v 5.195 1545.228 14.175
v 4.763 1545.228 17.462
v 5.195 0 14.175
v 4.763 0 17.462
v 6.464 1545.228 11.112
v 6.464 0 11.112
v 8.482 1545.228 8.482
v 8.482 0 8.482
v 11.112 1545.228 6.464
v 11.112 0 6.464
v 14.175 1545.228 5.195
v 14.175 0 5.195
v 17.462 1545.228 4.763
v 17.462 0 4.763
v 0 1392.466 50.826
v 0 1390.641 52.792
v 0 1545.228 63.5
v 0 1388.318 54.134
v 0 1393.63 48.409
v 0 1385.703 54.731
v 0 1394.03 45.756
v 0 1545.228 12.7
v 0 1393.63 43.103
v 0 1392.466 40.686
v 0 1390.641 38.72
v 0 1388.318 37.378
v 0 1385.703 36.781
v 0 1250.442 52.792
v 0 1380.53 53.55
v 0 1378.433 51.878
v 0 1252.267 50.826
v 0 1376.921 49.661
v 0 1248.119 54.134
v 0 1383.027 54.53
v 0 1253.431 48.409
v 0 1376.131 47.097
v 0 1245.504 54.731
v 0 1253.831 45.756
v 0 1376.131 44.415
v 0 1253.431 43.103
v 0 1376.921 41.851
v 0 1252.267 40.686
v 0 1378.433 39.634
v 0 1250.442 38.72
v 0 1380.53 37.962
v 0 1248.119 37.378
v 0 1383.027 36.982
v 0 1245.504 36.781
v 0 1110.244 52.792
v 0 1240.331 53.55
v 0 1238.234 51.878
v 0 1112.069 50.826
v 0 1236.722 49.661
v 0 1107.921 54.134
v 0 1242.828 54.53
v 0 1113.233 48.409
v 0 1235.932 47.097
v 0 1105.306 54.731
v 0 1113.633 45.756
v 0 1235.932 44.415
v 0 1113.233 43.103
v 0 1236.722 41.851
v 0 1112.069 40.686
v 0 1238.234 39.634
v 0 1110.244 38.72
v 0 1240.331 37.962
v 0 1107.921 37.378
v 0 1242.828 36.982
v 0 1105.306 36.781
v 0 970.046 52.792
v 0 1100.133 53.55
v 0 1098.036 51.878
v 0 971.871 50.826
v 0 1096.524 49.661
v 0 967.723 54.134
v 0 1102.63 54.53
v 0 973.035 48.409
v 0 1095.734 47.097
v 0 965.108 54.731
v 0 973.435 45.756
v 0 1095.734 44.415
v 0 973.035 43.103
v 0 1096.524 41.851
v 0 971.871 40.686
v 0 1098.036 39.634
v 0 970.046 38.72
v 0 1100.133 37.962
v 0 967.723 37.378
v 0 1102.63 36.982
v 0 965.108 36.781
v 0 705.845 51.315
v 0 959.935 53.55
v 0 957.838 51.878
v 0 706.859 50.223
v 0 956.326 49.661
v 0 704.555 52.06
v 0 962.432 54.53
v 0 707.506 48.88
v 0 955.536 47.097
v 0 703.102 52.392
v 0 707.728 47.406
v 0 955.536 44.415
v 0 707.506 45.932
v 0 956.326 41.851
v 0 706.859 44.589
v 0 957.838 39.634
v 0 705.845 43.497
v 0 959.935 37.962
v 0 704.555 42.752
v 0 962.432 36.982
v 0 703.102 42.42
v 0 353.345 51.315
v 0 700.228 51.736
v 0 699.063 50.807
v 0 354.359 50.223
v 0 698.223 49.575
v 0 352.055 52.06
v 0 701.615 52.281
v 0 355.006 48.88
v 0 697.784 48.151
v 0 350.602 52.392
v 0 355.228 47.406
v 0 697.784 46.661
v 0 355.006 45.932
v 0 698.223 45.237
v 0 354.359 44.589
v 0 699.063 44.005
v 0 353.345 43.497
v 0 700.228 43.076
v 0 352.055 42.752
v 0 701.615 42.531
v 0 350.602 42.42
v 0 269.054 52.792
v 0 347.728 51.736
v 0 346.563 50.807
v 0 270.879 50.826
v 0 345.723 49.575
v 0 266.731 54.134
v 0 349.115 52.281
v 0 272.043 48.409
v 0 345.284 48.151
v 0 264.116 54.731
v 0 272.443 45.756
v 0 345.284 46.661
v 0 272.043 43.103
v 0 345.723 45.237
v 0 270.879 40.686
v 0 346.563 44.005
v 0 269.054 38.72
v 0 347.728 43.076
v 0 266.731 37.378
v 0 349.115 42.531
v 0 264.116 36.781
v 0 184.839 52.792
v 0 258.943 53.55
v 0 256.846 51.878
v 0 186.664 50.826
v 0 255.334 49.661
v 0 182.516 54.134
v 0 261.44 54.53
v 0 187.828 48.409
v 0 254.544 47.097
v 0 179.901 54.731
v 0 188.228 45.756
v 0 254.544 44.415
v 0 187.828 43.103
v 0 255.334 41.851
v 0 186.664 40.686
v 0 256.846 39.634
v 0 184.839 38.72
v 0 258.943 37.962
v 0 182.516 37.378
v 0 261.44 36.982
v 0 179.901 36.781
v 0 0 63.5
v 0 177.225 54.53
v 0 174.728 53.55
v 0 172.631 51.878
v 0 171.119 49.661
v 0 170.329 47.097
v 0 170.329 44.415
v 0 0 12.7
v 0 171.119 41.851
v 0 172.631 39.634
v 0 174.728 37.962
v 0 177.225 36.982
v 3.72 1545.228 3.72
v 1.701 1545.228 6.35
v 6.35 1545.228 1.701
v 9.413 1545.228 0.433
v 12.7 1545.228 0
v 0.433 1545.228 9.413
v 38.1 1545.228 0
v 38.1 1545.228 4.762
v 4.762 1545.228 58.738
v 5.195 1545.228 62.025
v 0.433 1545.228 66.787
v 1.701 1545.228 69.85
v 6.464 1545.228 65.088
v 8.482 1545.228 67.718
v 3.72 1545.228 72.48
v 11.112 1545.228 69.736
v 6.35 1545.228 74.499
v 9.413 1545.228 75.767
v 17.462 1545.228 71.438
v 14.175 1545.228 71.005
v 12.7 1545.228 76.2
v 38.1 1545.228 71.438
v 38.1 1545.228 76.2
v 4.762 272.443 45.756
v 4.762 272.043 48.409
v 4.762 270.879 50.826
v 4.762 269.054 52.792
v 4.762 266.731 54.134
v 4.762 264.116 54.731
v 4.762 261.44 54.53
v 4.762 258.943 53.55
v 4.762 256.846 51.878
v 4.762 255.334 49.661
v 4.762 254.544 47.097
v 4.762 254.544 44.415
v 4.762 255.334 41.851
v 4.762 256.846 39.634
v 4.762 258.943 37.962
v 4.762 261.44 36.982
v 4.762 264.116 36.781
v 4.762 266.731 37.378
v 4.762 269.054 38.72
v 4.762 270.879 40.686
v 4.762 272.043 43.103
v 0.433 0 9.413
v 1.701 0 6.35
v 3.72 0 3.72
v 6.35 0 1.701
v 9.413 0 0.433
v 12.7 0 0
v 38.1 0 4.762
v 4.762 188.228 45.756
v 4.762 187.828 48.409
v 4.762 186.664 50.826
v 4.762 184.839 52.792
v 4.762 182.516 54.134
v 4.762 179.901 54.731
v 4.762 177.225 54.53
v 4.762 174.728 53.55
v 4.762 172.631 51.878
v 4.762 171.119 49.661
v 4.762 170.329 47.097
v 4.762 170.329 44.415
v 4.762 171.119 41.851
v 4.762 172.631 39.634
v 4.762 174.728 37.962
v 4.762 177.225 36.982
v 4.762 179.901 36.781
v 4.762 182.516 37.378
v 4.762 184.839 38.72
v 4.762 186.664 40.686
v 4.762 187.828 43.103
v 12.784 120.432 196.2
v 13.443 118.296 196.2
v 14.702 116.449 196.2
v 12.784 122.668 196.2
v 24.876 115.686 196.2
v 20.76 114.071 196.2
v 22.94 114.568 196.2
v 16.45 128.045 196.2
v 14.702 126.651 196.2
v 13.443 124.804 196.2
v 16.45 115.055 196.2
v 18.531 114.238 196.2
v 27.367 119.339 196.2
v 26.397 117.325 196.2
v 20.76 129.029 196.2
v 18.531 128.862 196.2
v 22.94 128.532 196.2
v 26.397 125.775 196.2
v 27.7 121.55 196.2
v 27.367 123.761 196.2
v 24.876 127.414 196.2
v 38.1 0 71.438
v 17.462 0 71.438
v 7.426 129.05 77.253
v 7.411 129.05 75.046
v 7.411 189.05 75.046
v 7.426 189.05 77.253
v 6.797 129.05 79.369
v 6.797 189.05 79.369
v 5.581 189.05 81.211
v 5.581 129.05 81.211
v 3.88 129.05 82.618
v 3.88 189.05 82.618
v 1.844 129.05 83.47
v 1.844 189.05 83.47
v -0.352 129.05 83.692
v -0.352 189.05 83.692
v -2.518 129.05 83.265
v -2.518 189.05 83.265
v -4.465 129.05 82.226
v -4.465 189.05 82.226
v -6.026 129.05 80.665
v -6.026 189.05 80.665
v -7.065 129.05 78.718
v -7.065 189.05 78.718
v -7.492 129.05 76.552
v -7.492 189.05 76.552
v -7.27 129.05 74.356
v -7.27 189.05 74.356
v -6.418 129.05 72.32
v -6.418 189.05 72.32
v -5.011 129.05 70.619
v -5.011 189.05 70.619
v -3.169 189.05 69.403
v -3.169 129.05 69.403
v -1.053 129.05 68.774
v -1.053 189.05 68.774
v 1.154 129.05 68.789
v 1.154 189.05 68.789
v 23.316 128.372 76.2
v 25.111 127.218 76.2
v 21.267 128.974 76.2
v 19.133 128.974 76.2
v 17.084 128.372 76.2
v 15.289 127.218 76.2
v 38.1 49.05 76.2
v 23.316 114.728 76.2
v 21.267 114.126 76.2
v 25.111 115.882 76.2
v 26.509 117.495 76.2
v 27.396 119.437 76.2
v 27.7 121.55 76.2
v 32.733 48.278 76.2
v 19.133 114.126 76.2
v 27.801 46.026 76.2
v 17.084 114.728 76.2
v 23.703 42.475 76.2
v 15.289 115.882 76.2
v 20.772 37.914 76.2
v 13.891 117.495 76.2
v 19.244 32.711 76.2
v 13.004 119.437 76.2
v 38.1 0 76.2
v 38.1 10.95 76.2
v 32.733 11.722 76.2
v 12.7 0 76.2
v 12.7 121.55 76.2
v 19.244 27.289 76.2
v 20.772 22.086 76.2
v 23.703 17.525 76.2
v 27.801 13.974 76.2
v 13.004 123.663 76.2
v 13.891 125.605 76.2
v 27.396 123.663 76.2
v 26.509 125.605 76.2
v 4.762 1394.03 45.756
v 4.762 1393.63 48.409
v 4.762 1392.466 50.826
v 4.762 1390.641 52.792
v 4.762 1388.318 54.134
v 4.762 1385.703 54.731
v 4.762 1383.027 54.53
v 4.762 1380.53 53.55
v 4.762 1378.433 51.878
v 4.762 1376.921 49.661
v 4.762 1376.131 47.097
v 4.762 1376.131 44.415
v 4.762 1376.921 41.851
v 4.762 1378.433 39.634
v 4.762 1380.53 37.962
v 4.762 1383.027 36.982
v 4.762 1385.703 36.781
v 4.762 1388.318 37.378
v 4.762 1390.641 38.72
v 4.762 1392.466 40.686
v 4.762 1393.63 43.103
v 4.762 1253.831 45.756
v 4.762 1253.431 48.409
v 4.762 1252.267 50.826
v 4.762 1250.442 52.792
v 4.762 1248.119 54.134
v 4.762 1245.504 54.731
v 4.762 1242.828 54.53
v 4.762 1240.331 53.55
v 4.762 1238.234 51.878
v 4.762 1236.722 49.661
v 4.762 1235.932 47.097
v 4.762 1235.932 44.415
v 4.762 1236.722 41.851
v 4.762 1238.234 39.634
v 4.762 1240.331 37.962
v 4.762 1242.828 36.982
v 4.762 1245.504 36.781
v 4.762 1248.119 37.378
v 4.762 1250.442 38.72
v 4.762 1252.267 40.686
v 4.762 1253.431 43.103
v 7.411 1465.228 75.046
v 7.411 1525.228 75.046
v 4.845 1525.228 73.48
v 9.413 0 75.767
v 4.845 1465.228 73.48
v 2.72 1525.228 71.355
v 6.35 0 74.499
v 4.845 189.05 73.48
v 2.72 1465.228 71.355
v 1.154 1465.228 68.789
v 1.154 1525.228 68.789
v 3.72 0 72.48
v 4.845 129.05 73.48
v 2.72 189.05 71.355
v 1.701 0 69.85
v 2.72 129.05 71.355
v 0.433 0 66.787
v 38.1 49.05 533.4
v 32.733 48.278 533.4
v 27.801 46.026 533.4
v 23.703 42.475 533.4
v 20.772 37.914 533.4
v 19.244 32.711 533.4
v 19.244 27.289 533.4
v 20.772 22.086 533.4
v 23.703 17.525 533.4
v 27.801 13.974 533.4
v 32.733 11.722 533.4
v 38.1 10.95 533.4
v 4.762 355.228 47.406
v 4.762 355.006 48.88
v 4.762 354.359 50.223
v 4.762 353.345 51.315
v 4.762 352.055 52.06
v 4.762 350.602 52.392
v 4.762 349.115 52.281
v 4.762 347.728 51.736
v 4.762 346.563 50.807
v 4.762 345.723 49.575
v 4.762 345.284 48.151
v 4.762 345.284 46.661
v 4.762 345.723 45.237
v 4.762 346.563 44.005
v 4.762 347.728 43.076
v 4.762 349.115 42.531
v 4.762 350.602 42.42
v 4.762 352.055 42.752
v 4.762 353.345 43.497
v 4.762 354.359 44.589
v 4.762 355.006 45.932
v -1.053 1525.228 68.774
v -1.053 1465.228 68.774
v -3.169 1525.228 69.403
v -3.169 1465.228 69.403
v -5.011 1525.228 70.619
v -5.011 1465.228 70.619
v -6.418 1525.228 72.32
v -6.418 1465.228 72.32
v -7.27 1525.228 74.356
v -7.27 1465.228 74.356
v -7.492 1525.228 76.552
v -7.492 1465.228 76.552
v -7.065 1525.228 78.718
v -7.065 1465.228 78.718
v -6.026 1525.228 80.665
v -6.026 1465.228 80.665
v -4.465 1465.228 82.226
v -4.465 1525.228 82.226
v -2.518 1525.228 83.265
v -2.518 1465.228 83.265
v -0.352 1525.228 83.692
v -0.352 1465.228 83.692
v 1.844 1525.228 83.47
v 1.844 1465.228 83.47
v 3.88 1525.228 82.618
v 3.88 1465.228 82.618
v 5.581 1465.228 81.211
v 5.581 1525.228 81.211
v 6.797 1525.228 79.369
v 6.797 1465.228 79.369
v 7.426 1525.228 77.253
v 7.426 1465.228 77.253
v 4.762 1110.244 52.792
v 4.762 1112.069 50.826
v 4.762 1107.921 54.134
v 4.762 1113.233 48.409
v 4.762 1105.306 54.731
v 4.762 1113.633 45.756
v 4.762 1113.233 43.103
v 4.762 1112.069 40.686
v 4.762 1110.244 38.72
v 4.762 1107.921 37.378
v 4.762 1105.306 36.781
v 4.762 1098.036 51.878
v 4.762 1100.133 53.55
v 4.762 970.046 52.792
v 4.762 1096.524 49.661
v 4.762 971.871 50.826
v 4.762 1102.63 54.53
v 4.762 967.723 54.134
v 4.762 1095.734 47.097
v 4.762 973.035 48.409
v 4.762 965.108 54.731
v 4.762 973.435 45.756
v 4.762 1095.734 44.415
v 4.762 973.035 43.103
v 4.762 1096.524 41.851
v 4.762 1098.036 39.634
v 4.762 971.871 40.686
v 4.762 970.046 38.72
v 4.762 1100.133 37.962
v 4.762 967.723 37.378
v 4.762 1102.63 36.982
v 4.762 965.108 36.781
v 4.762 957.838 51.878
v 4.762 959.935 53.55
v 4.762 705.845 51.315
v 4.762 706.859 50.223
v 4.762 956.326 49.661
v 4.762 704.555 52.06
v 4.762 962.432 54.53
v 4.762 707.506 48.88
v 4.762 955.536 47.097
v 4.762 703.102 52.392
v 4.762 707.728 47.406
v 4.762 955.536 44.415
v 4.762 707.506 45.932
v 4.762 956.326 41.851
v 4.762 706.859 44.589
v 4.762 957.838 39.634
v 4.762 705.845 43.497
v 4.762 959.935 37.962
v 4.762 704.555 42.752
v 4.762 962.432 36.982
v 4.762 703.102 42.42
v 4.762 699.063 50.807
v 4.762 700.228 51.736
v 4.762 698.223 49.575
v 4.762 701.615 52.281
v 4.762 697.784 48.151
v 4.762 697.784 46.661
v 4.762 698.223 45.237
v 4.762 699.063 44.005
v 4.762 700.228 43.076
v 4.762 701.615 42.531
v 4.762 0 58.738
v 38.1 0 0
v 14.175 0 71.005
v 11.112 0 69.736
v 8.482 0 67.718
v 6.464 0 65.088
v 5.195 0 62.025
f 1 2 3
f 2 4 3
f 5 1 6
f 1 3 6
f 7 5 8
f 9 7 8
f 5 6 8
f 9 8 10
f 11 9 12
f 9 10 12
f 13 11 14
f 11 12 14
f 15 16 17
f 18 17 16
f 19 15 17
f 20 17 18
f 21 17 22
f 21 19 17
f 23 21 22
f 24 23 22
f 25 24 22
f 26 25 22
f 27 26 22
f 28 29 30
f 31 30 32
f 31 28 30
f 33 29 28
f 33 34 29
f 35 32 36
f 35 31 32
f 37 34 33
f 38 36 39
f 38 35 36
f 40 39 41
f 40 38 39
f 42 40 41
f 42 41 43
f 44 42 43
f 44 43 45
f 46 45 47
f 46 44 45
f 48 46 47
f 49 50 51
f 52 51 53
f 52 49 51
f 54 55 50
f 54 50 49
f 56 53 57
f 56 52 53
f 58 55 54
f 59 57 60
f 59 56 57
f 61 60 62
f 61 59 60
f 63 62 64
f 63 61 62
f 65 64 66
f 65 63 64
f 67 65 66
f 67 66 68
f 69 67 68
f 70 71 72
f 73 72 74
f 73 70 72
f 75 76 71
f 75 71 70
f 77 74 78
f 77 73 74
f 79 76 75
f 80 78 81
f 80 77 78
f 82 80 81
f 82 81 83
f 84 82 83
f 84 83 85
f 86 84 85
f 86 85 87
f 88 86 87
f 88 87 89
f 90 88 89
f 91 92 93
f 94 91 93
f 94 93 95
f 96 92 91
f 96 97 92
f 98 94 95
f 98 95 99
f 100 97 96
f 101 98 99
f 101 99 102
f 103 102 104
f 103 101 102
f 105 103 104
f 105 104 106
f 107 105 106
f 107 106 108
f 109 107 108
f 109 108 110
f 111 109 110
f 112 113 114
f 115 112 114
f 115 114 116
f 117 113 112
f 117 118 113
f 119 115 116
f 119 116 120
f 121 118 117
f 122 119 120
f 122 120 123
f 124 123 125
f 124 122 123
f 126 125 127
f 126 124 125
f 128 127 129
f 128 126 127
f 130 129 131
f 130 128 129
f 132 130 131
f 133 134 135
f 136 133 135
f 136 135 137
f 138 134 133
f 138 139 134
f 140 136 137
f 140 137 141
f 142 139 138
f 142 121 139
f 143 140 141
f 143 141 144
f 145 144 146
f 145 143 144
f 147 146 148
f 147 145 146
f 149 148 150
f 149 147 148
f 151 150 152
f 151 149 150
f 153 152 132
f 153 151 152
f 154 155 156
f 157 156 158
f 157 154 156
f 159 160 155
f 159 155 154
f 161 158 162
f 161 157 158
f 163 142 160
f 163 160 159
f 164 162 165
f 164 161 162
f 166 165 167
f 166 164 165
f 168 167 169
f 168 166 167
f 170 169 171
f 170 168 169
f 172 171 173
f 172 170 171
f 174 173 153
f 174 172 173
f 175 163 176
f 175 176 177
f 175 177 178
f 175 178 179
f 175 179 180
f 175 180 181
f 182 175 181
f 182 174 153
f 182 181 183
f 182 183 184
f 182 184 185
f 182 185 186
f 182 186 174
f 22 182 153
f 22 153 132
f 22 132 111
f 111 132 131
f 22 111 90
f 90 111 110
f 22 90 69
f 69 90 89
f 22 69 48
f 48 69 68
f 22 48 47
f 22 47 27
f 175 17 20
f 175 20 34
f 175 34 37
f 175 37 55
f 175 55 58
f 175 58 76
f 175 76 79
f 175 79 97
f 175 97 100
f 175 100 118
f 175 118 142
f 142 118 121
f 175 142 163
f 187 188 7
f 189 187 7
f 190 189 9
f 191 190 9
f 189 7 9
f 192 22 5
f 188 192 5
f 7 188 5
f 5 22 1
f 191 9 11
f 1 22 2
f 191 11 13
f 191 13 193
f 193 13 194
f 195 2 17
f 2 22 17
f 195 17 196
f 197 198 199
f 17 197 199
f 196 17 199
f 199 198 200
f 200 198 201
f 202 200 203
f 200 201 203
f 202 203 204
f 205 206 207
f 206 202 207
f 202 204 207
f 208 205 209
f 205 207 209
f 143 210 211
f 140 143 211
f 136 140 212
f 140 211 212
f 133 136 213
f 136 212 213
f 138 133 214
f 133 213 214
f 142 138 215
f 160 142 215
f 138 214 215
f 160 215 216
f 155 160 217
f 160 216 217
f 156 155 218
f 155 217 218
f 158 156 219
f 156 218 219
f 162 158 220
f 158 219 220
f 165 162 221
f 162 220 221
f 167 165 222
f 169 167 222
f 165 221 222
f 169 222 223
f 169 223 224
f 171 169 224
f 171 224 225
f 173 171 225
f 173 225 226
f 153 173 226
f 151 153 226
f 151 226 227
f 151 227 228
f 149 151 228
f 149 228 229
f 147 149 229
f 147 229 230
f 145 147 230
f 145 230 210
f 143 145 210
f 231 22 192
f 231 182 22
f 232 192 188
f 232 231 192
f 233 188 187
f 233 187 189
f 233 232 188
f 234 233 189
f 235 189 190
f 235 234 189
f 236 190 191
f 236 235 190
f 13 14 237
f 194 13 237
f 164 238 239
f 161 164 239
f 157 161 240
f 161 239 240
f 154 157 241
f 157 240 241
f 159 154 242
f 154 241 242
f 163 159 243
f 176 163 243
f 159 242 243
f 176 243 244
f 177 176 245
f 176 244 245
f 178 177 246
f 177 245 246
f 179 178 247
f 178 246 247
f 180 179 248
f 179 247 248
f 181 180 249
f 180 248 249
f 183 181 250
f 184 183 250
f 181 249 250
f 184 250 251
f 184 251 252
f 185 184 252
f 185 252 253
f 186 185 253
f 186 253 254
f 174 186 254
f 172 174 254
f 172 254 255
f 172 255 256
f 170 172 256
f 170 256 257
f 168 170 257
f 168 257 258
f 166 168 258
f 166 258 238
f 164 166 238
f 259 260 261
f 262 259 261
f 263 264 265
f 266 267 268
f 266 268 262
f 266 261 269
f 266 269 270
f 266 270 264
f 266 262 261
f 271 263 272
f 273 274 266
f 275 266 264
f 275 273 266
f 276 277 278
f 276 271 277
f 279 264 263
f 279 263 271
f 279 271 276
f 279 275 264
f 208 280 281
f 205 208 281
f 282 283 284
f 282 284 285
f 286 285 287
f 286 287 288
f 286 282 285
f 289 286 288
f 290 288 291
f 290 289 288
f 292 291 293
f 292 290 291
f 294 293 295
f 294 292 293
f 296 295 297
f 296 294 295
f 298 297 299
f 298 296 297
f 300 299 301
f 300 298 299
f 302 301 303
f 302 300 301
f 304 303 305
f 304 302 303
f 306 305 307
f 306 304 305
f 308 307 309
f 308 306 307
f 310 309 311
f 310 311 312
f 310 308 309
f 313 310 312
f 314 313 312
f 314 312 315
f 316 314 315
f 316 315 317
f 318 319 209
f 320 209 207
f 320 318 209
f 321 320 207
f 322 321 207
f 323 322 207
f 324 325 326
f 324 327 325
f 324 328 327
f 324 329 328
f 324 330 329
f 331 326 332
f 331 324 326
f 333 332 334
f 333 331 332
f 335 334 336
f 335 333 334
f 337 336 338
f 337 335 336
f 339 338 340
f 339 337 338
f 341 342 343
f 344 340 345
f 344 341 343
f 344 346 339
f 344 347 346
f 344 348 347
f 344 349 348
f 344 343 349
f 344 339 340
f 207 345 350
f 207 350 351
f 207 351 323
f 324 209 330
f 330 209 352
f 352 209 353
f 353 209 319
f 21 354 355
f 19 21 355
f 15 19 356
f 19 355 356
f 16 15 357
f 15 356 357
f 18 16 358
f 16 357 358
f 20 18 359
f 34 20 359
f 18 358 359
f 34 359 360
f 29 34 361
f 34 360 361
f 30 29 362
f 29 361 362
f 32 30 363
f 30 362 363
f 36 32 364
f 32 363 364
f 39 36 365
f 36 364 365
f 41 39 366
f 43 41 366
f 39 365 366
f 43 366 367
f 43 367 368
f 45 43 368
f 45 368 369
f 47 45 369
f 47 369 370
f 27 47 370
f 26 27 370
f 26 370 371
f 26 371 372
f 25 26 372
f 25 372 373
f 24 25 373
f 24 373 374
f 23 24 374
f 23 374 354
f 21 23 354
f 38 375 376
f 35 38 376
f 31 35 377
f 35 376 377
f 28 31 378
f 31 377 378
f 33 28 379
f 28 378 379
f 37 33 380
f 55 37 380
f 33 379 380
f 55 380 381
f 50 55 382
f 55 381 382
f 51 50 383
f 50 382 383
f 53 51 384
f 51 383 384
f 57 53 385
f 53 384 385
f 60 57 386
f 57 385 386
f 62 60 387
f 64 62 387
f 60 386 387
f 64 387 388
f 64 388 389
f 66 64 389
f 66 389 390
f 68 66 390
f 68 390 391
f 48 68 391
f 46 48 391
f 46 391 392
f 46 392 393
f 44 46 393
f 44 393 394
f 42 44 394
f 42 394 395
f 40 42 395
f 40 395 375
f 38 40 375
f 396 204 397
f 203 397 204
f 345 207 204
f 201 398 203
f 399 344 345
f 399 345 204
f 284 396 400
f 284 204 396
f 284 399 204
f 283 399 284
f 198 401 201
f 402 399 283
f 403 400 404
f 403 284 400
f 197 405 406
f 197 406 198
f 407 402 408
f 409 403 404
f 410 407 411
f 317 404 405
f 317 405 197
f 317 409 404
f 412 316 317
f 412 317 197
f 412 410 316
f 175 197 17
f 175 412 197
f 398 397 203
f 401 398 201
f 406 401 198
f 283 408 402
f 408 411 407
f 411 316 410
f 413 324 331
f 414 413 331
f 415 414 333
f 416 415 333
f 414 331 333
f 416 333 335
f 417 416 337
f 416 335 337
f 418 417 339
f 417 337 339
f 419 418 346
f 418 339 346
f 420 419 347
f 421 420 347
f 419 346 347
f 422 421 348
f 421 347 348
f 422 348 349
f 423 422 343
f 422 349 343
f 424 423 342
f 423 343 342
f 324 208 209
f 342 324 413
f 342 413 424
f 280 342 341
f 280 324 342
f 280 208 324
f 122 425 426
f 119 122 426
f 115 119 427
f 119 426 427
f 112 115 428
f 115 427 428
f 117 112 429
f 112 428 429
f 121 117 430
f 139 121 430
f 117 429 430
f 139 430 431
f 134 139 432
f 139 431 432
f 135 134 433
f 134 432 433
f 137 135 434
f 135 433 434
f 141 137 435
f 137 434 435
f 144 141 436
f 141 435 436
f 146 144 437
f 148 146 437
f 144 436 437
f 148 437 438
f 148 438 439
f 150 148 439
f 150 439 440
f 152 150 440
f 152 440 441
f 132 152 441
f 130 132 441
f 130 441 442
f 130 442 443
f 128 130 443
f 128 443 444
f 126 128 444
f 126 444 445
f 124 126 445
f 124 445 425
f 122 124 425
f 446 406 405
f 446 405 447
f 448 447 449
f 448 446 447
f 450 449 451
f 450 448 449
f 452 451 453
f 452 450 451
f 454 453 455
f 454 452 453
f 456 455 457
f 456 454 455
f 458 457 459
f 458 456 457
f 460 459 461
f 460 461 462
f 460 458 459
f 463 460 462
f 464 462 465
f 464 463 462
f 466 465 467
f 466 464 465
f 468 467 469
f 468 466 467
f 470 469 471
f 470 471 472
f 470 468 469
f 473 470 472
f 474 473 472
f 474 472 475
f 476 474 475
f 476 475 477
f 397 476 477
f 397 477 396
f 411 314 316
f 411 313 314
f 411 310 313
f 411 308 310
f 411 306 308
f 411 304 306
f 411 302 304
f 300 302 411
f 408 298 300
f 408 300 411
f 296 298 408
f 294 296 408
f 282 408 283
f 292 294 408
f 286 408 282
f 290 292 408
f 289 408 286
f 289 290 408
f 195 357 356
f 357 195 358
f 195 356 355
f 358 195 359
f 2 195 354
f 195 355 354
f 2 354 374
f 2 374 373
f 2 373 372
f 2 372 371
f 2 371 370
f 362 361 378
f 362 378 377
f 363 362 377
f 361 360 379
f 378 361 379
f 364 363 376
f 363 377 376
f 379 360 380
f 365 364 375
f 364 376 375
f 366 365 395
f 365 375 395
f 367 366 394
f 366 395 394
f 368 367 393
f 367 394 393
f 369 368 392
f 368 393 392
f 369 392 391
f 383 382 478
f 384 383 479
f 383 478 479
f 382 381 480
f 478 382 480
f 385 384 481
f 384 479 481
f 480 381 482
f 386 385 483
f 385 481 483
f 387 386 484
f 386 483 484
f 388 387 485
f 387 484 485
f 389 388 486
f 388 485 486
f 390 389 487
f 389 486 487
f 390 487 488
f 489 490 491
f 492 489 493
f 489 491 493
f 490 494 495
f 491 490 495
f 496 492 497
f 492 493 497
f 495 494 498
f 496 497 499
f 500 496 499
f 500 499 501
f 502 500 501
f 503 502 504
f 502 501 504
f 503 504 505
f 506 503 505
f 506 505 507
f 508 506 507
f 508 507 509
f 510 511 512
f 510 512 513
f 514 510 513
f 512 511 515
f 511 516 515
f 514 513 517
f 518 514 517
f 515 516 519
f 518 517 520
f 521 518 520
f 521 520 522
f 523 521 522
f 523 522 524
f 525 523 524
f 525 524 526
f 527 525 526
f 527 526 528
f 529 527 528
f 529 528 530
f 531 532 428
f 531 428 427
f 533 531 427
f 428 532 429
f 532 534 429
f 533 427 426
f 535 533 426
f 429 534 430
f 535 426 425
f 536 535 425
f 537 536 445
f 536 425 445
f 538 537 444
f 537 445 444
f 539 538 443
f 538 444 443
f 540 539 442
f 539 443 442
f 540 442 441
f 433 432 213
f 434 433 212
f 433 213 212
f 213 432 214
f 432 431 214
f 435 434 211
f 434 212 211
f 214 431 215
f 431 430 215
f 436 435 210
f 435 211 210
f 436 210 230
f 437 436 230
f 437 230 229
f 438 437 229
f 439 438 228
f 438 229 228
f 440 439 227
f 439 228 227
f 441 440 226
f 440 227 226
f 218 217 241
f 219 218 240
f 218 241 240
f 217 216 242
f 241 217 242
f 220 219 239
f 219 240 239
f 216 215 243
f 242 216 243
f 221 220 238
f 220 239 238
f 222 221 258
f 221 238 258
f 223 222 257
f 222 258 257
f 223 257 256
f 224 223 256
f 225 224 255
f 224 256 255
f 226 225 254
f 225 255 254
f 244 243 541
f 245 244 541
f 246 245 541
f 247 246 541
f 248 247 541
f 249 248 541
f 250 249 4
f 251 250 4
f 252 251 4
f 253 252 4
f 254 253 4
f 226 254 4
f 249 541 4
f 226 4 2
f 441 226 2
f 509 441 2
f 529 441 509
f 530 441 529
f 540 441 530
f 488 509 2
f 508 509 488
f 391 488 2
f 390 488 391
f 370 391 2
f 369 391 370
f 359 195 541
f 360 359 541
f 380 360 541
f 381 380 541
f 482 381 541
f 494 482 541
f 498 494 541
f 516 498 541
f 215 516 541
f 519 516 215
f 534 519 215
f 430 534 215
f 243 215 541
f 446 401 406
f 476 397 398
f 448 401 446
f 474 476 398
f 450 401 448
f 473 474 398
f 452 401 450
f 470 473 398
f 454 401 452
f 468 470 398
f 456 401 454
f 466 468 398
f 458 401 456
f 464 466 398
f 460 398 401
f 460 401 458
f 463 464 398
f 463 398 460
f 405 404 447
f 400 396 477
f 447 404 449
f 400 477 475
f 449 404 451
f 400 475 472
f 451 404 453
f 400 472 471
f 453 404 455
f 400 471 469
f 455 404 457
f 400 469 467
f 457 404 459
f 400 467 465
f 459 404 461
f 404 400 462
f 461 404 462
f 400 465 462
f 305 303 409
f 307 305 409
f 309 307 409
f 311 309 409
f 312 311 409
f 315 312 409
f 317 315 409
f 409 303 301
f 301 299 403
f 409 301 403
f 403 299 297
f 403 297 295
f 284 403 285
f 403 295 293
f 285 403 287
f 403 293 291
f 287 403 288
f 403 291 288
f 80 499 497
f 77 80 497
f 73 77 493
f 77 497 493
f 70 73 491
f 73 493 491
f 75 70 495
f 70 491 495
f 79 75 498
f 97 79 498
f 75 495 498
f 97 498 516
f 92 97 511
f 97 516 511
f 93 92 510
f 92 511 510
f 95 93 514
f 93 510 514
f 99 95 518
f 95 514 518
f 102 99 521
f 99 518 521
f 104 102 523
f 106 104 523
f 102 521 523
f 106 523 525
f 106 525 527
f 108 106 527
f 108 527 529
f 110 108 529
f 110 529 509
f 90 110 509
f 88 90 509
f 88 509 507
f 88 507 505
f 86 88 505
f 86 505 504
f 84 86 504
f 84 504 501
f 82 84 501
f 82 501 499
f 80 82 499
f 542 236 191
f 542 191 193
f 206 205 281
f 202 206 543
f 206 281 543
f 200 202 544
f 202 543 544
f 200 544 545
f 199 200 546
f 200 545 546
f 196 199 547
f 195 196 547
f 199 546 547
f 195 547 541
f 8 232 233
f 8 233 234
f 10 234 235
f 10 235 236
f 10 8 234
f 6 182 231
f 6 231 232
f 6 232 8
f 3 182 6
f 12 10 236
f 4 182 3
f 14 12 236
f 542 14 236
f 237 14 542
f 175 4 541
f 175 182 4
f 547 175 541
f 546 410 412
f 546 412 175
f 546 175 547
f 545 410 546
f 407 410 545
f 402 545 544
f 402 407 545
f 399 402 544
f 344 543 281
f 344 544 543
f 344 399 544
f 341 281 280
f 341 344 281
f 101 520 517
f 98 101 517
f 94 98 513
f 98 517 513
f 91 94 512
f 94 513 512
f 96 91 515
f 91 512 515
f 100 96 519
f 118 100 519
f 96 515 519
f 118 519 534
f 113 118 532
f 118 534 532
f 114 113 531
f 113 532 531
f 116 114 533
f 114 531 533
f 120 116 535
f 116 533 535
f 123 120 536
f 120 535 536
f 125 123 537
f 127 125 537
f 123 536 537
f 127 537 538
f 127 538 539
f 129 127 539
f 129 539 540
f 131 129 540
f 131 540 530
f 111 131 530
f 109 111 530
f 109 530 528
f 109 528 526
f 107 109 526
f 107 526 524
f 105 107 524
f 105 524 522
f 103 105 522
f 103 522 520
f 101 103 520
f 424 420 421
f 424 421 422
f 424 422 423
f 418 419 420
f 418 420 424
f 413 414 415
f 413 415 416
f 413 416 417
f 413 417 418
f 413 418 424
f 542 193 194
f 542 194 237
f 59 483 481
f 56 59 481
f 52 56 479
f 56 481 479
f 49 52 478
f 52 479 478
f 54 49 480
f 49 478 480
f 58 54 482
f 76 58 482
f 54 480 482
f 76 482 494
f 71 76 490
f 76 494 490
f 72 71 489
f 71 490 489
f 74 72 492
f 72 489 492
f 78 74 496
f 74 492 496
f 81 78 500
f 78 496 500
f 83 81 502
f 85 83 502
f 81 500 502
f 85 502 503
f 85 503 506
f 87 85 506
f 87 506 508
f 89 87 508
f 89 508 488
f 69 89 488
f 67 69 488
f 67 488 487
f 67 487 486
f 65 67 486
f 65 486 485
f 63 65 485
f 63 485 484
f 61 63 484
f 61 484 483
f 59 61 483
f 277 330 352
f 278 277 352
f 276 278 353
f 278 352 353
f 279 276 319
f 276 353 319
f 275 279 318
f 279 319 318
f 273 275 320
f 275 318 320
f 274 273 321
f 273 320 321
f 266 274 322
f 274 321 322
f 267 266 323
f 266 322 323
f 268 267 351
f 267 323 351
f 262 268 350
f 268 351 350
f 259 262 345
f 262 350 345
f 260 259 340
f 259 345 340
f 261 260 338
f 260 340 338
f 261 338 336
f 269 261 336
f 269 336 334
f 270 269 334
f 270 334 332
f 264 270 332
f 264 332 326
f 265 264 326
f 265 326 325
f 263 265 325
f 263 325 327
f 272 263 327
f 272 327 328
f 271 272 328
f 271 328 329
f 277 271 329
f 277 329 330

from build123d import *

# Parameters (mm, degrees)
F1_DEPTH  = 1525.228
F3_DEPTH  = 1525.228
F5_D      = 19
F5_DEPTH  = 5
F5_TIP    = 5.7081758808
F7_D      = 9
F7_DEPTH  = 5
F7_TIP    = 2.7038727856
F8_R      = 19.05
F9_DEPTH  = 457.2
F10_R     = 7.5
F11_DEPTH = 120
F12_DEPTH = 20
F16_R     = 7.5
F17_DEPTH = 60
F22_R     = 7.5
F23_DEPTH = 60
F28_D     = 15
F28_DEPTH = 5
F28_TIP   = 4.5064546427
F30_D     = 18
F30_DEPTH = 5
F30_TIP   = 5.4077455712
F32_D     = 10
F32_DEPTH = 5
F32_TIP   = 3.0043030951
F33_W     = 75
F33_H     = 1545.228
F34_DEPTH = 2500


# Not quite as in the source:
# - a feature names something its author has since deleted; it is built from what else it names


with BuildPart() as f1:
    # F0 (on Front) → F1 (new body)
    with BuildSketch(Plane.XZ):
        with BuildLine():
            ThreePointArc((0, 12.7), (3.7197438789, 3.7197438789), (12.7, 0))
            Line((12.7, 0), (63.5, 0))
            ThreePointArc((63.5, 0), (72.4802561211, 3.7197438789), (76.2, 12.7))
            Line((76.2, 12.7), (76.2, 63.5))
            ThreePointArc((76.2, 63.5), (72.4802561211, 72.4802561211), (63.5, 76.2))
            Line((63.5, 76.2), (12.7, 76.2))
            ThreePointArc((12.7, 76.2), (3.7197438789, 72.4802561211), (0, 63.5))
            Line((0, 63.5), (0, 12.7))
        make_face()
    extrude(amount=-F1_DEPTH)

    # F2 (on face) → F3 (cut)
    with BuildSketch(Plane.XZ):
        with BuildLine():
            Line((17.4625, 4.7625), (38.1, 4.7625))
            Line((38.1, 4.7625), (58.7375, 4.7625))
            ThreePointArc((58.7375, 4.7625), (67.7177561211, 8.4822438789), (71.4375, 17.4625))
            Line((71.4375, 17.4625), (71.4375, 58.7375))
            ThreePointArc((71.4375, 58.7375), (67.7177561211, 67.7177561211), (58.7375, 71.4375))
            Line((58.7375, 71.4375), (17.4625, 71.4375))
            ThreePointArc((17.4625, 71.4375), (8.4822438789, 67.7177561211), (4.7625, 58.7375))
            Line((4.7625, 58.7375), (4.7625, 17.4625))
            ThreePointArc((4.7625, 17.4625), (8.4822438789, 8.4822438789), (17.4625, 4.7625))
        make_face()
    extrude(amount=-F3_DEPTH, mode=Mode.SUBTRACT)

    # F5
    with Locations(Plane.YZ.offset(76.2)):
        with Locations((1335.228, 46.2), (1105.028, 46.2), (653.528, 46.2), (381.528, 46.2), (179.528, 46.2)):
            Hole(F5_D / 2, depth=F5_DEPTH)
            with Locations((0, 0, -(F5_DEPTH + F5_TIP / 2))):  # 118° drill point
                Cone(0, F5_D / 2, F5_TIP, mode=Mode.SUBTRACT)

    # F7
    with Locations(Plane.YZ.offset(76.2)):
        with Locations((261.933, 31.2), (501.133, 31.2), (760.333, 31.2), (979.533, 31.2), (1218.698, 31.2)):
            Hole(F7_D / 2, depth=F7_DEPTH)
            with Locations((0, 0, -(F7_DEPTH + F7_TIP / 2))):  # 118° drill point
                Cone(0, F7_D / 2, F7_TIP, mode=Mode.SUBTRACT)

    # F8 (on face) → F9 (join)
    with BuildSketch(Plane.XY.offset(76.2)):
        with Locations((38.1, 30)):
            Circle(F8_R)
    extrude(amount=F9_DEPTH)

    # F10 (on face) → F11 (join)
    with BuildSketch(Plane.XY.offset(76.2)):
        with Locations((20.2, 121.55)):
            Circle(F10_R)
    extrude(amount=F11_DEPTH)

    # F12 (add): a face of the model
    f12_faces = [f1.faces().sort_by_distance(p)[0] for p in [
        (1.0776307345, 1525.228, 38.1),
    ]]
    extrude(f12_faces, amount=F12_DEPTH)

    # F16 (on 3pt) → F17 (join)
    with BuildSketch(Plane.XZ.offset(-129.05)):
        with Locations((0, 76.2)):
            Circle(F16_R)
    extrude(amount=-F17_DEPTH)

    # F22 (on 3pt) → F23 (join)
    with BuildSketch(Plane(origin=(0, 1525.228, 0), x_dir=(-1, 0, 0), z_dir=(0, 1, 0))):
        with Locations((0, 76.2)):
            Circle(F22_R)
    extrude(amount=-F23_DEPTH)

    # F28
    with Locations(Plane.YZ.offset(76.2)):
        with Locations((1442.058, 31.2)):
            Hole(F28_D / 2, depth=F28_DEPTH)
            with Locations((0, 0, -(F28_DEPTH + F28_TIP / 2))):  # 118° drill point
                Cone(0, F28_D / 2, F28_TIP, mode=Mode.SUBTRACT)

    # F30
    with Locations(Plane(origin=(0, 0, 0), x_dir=(0, -1, 0), z_dir=(-1, 0, 0))):
        with Locations((-1385.03, 45.756), (-1244.831, 45.756), (-1104.633, 45.756), (-964.435, 45.756), (-263.443, 45.756), (-179.228, 45.756)):
            Hole(F30_D / 2, depth=F30_DEPTH)
            with Locations((0, 0, -(F30_DEPTH + F30_TIP / 2))):  # 118° drill point
                Cone(0, F30_D / 2, F30_TIP, mode=Mode.SUBTRACT)

    # F32
    with Locations(Plane(origin=(0, 0, 0), x_dir=(0, -1, 0), z_dir=(-1, 0, 0))):
        with Locations((-702.728, 47.406), (-350.228, 47.406)):
            Hole(F32_D / 2, depth=F32_DEPTH)
            with Locations((0, 0, -(F32_DEPTH + F32_TIP / 2))):  # 118° drill point
                Cone(0, F32_D / 2, F32_TIP, mode=Mode.SUBTRACT)

    # F33 (on face) → F34 (cut)
    with BuildSketch(Plane(origin=(0, 0, 0), x_dir=(1, 0, 0), z_dir=(0, 0, -1))):
        with Locations((75.6, -772.614)):
            Rectangle(F33_W, F33_H)
    extrude(amount=-F34_DEPTH, mode=Mode.SUBTRACT)


solid = f1.part
